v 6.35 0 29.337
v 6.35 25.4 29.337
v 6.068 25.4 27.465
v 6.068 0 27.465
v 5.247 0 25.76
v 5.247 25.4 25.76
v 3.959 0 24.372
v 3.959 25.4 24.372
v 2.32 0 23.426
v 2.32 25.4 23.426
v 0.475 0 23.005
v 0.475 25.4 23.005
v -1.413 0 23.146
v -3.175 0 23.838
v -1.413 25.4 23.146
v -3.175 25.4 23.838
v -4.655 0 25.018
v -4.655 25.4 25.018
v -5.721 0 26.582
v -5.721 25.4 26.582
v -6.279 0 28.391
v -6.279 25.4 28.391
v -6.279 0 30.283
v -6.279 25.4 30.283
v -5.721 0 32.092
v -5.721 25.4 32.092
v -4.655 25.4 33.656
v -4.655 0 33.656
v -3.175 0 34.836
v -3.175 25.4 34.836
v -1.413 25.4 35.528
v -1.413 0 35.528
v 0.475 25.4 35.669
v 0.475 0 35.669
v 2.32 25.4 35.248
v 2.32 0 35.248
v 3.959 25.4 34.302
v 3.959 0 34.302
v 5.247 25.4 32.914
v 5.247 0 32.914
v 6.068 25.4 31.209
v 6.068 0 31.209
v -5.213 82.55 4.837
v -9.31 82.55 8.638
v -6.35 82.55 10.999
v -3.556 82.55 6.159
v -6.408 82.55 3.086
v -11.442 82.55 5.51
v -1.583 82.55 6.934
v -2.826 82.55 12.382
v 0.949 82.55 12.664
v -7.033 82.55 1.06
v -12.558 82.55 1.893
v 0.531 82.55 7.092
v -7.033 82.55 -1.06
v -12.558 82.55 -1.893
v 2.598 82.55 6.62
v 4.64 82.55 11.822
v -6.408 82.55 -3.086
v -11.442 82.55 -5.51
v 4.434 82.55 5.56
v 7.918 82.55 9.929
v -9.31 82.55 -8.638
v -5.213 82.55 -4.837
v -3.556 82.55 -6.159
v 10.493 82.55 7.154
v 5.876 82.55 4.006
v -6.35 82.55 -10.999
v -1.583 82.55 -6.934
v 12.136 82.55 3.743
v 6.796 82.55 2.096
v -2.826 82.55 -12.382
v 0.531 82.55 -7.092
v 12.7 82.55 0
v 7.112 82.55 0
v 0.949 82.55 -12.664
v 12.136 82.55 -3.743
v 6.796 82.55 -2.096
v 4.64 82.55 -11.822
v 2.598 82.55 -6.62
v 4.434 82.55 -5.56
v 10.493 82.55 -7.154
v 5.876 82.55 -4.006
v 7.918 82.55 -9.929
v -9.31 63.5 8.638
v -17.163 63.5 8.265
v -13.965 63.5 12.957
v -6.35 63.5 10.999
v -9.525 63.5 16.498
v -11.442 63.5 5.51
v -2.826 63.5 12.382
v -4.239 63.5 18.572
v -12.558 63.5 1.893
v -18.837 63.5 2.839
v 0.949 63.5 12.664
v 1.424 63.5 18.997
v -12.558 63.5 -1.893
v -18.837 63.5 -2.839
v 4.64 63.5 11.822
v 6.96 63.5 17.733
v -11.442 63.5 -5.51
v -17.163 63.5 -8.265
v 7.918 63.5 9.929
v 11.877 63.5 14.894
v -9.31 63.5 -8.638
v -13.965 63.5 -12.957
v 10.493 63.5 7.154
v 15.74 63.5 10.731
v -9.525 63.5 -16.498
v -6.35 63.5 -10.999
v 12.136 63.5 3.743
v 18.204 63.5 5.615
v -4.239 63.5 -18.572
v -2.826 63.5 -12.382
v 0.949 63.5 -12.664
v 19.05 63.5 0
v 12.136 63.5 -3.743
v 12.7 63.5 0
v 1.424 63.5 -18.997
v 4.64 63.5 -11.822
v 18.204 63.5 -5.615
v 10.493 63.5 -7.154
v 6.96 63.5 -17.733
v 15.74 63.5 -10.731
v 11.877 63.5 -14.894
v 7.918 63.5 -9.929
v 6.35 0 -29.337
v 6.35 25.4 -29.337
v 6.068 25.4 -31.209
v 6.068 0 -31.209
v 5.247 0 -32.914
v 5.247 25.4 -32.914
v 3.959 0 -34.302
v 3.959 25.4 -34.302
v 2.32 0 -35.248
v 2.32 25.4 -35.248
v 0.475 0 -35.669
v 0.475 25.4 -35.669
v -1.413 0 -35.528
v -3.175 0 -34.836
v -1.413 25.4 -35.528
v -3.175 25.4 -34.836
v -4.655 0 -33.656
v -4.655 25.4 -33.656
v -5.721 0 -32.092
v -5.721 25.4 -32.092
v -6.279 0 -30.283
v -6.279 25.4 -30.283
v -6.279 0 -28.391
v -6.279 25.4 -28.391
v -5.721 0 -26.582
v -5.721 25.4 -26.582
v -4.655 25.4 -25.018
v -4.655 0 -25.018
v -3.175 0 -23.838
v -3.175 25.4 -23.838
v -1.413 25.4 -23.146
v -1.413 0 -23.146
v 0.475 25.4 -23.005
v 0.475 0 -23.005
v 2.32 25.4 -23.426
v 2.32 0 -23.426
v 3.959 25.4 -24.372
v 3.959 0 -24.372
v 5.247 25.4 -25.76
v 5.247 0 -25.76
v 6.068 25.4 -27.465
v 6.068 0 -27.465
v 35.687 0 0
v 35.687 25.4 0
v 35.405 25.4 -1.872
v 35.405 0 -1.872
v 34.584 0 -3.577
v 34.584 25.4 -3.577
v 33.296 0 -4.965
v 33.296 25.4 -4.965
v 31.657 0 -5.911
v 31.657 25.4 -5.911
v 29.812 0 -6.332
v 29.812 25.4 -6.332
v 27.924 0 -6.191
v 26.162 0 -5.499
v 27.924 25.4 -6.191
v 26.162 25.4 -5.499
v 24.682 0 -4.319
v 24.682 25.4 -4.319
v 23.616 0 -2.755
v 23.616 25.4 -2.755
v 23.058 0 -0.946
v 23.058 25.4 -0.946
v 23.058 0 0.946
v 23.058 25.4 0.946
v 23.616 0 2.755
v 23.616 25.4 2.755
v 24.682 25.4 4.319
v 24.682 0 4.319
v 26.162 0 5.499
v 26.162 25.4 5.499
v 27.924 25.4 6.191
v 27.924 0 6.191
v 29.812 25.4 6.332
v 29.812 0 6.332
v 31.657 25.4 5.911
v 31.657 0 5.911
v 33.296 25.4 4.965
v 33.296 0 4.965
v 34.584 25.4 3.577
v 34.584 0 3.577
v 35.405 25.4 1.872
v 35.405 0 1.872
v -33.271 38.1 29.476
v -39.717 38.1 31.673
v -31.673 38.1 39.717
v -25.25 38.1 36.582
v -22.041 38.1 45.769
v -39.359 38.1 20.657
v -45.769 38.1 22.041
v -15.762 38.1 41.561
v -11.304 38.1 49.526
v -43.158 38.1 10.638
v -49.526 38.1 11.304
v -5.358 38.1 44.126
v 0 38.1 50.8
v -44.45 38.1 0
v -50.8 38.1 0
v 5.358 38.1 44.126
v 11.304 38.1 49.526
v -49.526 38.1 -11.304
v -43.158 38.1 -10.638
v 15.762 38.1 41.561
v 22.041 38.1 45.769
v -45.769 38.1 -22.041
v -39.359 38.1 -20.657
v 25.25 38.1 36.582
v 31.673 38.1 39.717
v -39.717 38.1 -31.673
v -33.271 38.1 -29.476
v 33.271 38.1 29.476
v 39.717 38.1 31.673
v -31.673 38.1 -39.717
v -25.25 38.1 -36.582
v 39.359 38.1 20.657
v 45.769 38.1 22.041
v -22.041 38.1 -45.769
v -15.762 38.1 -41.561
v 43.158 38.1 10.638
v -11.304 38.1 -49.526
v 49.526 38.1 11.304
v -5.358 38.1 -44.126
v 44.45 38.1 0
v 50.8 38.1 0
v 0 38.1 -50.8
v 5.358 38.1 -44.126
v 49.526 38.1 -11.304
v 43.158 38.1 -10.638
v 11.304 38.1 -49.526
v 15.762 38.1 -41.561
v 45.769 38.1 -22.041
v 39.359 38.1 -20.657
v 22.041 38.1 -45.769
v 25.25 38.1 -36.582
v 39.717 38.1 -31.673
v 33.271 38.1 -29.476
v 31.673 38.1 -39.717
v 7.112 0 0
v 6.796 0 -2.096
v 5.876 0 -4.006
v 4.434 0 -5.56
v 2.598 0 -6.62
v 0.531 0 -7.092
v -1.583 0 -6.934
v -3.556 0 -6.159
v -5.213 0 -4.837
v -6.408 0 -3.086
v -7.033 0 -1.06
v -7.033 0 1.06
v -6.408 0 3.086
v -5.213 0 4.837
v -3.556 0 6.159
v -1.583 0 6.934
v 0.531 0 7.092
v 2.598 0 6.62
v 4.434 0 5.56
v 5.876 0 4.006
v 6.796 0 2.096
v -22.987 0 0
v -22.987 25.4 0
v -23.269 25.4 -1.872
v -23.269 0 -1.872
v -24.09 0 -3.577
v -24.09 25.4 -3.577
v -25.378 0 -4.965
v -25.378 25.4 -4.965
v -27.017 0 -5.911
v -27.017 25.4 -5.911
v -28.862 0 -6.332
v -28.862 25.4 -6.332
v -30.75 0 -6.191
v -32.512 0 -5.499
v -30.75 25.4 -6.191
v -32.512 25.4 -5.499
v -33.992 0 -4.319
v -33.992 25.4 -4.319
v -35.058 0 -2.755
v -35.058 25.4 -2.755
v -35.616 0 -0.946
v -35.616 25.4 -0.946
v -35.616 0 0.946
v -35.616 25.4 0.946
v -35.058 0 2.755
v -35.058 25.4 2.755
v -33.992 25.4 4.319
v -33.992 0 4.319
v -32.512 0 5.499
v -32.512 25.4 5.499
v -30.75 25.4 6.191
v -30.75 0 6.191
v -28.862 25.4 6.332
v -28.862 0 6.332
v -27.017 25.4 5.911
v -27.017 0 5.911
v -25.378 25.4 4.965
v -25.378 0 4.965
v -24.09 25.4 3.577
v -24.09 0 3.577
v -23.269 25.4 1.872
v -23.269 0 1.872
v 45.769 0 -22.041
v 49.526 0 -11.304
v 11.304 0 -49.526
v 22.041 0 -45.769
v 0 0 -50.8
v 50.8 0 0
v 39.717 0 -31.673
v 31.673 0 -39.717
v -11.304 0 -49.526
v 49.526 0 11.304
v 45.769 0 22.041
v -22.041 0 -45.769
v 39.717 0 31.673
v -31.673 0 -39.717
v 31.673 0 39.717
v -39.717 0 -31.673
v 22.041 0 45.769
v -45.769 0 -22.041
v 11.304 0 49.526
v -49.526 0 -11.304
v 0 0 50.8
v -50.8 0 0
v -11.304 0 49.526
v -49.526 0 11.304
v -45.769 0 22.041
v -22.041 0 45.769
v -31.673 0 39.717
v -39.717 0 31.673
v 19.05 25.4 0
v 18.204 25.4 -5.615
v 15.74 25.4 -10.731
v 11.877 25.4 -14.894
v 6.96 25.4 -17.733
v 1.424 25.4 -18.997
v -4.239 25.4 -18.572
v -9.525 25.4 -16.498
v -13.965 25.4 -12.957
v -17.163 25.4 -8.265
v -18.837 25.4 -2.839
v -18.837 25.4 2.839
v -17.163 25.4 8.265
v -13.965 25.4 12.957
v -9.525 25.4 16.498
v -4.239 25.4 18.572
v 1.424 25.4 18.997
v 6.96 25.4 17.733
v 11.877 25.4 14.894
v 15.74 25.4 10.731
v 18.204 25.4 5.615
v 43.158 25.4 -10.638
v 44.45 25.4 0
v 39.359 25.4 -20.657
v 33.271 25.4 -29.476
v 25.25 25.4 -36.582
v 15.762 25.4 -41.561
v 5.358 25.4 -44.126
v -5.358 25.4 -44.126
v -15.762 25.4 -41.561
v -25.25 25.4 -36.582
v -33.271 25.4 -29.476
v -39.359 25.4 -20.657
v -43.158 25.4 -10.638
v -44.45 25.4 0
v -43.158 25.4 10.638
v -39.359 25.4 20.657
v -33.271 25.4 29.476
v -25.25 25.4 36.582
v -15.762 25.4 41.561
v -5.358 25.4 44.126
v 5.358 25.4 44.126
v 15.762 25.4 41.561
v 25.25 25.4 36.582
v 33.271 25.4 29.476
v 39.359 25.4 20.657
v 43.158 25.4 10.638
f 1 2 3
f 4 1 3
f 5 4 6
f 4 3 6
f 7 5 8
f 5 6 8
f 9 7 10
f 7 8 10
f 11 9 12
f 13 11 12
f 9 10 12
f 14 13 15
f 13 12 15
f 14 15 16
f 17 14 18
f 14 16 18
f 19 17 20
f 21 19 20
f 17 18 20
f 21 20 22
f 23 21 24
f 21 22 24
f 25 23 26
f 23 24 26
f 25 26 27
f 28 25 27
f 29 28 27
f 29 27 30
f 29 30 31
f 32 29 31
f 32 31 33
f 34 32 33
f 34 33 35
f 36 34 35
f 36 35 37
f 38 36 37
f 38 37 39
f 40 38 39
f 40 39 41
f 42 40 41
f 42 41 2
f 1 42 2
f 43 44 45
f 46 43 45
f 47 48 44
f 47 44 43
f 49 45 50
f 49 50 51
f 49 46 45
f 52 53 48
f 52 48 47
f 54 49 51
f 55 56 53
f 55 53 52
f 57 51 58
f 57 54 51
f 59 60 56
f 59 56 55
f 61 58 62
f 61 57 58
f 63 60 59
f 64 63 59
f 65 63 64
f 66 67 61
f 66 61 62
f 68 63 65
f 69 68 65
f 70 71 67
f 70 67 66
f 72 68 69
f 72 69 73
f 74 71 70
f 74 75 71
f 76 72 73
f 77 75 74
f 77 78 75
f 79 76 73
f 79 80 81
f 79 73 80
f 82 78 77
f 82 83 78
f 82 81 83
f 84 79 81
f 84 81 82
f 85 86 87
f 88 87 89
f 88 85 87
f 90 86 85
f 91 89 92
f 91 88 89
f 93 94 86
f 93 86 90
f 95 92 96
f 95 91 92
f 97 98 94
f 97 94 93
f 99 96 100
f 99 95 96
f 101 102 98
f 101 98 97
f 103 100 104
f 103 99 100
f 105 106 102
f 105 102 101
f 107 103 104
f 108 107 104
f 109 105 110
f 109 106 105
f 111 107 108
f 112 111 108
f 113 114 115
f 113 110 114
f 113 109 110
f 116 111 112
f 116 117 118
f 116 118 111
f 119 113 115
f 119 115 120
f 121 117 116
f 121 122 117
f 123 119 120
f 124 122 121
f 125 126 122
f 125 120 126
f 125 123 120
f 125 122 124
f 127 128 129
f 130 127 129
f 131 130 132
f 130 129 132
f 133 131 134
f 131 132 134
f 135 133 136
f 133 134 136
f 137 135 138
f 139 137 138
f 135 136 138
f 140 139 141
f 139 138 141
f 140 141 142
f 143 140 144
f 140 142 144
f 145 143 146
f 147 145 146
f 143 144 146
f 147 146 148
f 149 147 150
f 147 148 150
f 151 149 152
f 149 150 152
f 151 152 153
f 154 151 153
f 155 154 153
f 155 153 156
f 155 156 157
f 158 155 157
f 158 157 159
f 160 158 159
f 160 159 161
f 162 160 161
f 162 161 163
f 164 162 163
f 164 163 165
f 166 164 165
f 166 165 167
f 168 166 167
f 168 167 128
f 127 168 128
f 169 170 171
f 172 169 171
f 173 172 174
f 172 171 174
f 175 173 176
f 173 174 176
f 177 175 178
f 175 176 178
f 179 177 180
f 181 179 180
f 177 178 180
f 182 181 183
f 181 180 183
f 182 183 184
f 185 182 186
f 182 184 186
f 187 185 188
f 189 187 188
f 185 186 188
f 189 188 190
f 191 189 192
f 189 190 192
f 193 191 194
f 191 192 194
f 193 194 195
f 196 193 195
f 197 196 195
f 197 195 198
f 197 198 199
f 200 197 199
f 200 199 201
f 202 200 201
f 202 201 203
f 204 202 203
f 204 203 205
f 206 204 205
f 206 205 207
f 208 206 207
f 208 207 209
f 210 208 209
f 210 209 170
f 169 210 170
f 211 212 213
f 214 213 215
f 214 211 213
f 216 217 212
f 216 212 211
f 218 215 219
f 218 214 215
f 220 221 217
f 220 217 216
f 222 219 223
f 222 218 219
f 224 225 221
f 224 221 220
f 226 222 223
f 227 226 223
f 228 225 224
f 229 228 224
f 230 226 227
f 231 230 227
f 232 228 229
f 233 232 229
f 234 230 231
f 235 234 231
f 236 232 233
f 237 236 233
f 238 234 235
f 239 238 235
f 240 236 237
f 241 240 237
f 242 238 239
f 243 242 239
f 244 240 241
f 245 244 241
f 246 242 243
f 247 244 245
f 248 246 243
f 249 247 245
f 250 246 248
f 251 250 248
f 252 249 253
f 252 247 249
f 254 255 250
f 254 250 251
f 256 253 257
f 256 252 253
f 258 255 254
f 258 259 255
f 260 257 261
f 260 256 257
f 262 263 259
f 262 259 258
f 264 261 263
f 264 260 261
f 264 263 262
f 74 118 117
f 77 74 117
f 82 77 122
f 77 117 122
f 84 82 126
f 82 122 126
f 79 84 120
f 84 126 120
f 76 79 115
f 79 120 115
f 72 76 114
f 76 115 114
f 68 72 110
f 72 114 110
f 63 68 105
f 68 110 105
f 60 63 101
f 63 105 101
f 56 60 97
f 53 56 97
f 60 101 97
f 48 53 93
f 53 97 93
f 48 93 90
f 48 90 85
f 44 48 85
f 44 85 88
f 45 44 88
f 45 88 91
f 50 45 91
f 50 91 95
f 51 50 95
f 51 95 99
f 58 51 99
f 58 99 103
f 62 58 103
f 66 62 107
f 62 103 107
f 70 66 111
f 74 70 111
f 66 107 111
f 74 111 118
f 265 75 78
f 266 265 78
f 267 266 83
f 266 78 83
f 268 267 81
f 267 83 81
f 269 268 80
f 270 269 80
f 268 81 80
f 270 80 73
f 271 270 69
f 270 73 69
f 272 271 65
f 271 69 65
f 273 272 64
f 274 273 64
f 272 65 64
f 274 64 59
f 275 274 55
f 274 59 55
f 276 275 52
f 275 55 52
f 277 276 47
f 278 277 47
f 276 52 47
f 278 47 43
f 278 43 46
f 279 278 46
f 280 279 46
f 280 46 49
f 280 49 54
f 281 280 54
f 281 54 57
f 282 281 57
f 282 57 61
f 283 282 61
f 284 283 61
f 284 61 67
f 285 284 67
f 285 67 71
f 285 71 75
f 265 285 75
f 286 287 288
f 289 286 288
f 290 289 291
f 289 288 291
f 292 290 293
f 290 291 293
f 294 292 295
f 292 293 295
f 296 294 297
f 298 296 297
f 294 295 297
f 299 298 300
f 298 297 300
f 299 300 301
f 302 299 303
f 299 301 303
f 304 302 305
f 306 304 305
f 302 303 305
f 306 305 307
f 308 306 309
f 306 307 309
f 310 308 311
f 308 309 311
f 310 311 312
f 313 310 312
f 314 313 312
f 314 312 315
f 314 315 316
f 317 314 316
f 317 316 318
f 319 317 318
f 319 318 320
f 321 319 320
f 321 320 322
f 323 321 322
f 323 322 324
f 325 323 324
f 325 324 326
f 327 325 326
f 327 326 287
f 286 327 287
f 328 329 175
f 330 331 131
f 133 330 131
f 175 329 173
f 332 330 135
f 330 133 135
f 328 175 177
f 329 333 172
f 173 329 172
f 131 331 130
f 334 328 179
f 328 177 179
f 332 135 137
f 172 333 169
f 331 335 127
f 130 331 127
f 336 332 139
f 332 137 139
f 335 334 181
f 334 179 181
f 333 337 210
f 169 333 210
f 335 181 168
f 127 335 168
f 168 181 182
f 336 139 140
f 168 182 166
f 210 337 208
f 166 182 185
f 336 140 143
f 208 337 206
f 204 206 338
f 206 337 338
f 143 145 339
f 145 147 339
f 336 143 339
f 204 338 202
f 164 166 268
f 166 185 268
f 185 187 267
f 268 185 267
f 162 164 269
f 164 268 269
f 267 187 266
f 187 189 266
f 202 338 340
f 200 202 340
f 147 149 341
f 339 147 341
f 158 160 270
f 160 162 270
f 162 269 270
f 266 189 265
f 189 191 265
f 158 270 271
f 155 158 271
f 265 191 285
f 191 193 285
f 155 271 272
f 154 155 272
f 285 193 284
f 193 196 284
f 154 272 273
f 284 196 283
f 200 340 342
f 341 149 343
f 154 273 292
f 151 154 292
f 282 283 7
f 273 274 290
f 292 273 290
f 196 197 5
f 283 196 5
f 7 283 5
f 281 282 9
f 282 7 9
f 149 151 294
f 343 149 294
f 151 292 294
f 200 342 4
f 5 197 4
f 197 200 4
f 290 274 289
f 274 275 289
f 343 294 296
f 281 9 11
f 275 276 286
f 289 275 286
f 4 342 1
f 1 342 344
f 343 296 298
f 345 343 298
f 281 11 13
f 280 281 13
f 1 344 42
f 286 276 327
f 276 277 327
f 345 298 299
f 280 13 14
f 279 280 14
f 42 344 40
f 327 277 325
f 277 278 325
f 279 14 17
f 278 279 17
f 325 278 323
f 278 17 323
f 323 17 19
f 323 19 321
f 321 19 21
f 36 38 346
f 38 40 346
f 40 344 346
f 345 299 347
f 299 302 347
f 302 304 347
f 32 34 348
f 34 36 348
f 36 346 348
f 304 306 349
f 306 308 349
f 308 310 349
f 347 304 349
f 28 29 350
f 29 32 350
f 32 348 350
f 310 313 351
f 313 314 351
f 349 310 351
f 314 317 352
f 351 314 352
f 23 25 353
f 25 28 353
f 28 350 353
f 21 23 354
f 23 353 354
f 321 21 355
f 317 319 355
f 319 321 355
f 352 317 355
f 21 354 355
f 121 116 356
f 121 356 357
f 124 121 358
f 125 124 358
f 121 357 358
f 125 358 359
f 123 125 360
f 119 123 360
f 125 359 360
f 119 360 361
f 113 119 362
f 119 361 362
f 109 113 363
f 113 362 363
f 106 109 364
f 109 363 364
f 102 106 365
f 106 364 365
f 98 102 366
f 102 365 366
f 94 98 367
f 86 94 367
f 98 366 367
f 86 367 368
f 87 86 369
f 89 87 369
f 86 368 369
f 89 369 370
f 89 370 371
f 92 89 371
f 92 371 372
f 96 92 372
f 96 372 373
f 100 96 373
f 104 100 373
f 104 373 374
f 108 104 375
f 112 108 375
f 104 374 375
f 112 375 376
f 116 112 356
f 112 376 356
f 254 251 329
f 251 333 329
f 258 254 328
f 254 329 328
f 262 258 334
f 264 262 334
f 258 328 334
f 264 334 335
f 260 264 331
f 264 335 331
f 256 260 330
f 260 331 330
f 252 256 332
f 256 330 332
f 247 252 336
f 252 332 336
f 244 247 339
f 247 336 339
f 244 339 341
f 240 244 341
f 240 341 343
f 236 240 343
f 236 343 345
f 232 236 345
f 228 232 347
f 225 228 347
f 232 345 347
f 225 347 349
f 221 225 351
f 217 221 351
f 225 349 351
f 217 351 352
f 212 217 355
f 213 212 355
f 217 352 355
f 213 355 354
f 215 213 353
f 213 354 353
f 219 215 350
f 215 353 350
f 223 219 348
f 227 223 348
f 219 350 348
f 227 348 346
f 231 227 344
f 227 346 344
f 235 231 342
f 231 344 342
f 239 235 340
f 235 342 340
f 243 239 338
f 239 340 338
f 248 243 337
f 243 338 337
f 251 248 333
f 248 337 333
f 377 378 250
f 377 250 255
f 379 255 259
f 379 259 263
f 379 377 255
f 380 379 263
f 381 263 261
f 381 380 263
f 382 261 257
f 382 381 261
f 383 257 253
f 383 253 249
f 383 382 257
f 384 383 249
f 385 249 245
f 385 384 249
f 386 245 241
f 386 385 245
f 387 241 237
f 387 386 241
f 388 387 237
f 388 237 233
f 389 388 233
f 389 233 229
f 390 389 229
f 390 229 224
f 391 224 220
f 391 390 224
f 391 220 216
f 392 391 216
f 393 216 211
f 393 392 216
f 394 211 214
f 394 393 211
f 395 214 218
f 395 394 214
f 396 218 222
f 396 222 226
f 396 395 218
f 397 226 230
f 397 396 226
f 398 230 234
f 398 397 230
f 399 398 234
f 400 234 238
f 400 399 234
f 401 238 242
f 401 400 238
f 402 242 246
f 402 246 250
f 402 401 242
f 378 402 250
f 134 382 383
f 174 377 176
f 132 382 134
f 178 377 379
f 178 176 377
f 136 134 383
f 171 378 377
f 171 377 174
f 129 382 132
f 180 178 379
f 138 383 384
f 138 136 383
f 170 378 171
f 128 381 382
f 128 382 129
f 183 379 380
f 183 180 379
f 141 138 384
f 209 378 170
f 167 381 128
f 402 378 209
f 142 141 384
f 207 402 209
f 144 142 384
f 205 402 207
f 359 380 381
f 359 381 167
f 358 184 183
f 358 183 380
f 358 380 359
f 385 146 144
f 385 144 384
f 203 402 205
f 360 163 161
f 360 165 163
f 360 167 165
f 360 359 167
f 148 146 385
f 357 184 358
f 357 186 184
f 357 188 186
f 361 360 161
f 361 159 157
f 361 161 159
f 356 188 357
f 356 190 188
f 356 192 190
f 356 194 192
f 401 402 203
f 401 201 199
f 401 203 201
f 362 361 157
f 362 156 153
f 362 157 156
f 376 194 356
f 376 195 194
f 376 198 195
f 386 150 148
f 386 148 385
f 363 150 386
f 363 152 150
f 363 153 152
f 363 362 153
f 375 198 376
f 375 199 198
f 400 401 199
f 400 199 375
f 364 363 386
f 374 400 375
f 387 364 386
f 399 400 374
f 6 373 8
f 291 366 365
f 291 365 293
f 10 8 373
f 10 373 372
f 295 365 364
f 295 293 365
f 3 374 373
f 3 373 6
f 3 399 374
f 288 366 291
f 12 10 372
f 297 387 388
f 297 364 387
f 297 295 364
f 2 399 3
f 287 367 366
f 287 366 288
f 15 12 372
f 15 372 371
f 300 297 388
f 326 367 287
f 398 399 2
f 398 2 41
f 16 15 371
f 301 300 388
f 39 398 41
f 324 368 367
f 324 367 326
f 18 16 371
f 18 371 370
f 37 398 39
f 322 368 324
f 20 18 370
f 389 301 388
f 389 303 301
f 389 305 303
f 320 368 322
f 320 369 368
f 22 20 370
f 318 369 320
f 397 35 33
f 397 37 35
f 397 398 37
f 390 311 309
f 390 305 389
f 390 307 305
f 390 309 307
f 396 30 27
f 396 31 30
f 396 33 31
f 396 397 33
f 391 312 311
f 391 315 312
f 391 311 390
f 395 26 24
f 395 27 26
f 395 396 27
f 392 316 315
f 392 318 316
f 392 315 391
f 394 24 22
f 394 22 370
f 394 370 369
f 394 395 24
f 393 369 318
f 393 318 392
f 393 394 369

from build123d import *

# Parameters (mm, degrees)
SKETCH1_W           = 50.8
SKETCH1_H           = 25.4
SKETCH2_R           = 6.35
CUT_EXTRUDE1_DEPTH  = 26.4
SKETCH4_R           = 50.8
SKETCH4_R_2         = 44.45
BOSS_EXTRUDE1_DEPTH = 12.7
SKETCH6_R           = 19.05
BOSS_EXTRUDE2_DEPTH = 38.1
SKETCH7_R           = 12.7
BOSS_EXTRUDE3_DEPTH = 19.05
SKETCH8_R           = 7.112
CUT_EXTRUDE2_DEPTH  = 83.55


with BuildPart() as part:
    # Sketch1 → Revolve1 (revolve)
    with BuildSketch(Plane.XY):
        with Locations((25.4, 12.7)):
            Rectangle(SKETCH1_W, SKETCH1_H)
    revolve(axis=Axis((0, 25.4, 0), (0, -1, 0)))

    # Sketch2 → Cut-Extrude1 (cut, through all)
    with BuildSketch(Plane(origin=(0, 25.4, 0), x_dir=(1, 0, 0), z_dir=(0, 1, 0))):
        with Locations((29.337, 0)):
            Circle(SKETCH2_R)
        with Locations((0, -29.337)):
            Circle(SKETCH2_R)
        with Locations((-29.337, 0)):
            Circle(SKETCH2_R)
        with Locations((0, 29.337)):
            Circle(SKETCH2_R)
    extrude(amount=-CUT_EXTRUDE1_DEPTH, mode=Mode.SUBTRACT)

    # Sketch4 → Boss-Extrude1 (add)
    with BuildSketch(Plane(origin=(0, 25.4, 0), x_dir=(1, 0, 0), z_dir=(0, 1, 0))):
        Circle(SKETCH4_R)
        Circle(SKETCH4_R_2, mode=Mode.SUBTRACT)
    extrude(amount=BOSS_EXTRUDE1_DEPTH)

    # Sketch6 → Boss-Extrude2 (add)
    with BuildSketch(Plane(origin=(0, 25.4, 0), x_dir=(1, 0, 0), z_dir=(0, 1, 0))):
        Circle(SKETCH6_R)
    extrude(amount=BOSS_EXTRUDE2_DEPTH)

    # Sketch7 → Boss-Extrude3 (add)
    with BuildSketch(Plane(origin=(0, 63.5, 0), x_dir=(1, 0, 0), z_dir=(0, 1, 0))):
        Circle(SKETCH7_R)
    extrude(amount=BOSS_EXTRUDE3_DEPTH)

    # Sketch8 → Cut-Extrude2 (cut, through all)
    with BuildSketch(Plane(origin=(0, 82.55, 0), x_dir=(1, 0, 0), z_dir=(0, 1, 0))):
        Circle(SKETCH8_R)
    extrude(amount=-CUT_EXTRUDE2_DEPTH, mode=Mode.SUBTRACT)


solid = part.part
